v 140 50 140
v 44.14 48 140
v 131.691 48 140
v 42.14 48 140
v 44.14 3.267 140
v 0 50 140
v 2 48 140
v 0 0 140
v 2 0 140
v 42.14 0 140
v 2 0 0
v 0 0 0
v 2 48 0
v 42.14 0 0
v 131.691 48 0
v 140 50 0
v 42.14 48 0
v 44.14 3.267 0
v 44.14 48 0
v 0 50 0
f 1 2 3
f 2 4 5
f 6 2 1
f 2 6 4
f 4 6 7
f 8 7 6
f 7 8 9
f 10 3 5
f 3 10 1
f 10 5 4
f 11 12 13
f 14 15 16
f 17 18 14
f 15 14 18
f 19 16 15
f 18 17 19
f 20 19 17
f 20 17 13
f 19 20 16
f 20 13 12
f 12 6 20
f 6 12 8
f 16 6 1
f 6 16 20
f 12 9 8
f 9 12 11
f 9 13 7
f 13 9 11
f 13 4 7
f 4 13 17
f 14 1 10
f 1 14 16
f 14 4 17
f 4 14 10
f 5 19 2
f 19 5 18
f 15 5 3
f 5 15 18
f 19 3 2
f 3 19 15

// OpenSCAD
walls = 5;
layer_width = 0.4;

thickness = walls * layer_width;
clearance = 0.07;

bed_h = 40;
lamp_d = 140;
rubber_h = 0.7;
clamp_h = 50;

function polar_to_cartesian(length, angle) = [length * cos(angle), length * sin(angle)];

a = lamp_d - bed_h + 2 * thickness + 2 * clearance;
b = clamp_h;
Cangle= atan(a/b);
angle= 180 - Cangle;
shift = polar_to_cartesian(thickness, angle);

Ax = bed_h + thickness + 2 * clearance;
Ay = 0;
Bx = lamp_d;
By = clamp_h;

Ax2 = Ax + shift[0];
Ay2 = Ay + shift[1];
Bx2 = Bx + shift[0];
By2 = By + shift[1];

v = [Bx2 - Ax2, By2 - Ay2];
n = [v[1] * -1, v[0]];
c = -n[0] * Bx2 - n[1] * By2;

x = bed_h + thickness + 2 * clearance + thickness;
y = (-c - n[0] * x) / n[1];

y2 = clamp_h - thickness;
x2 = (-c - n[1] * y2) / n[0];

difference() {
  cube([bed_h + 2 * thickness + 2 * clearance, clamp_h, lamp_d]);
  translate([thickness, -thickness, -1])
    cube([bed_h + thickness + 1, clamp_h, lamp_d + 2]);
}

difference() {
  linear_extrude(lamp_d)
    polygon(points = [
      [bed_h + thickness + 2 * clearance, 0],
      [lamp_d, clamp_h],
      [bed_h + thickness + 2 * clearance, clamp_h],
    ]);
  translate([0, 0, -1])
    linear_extrude(lamp_d + 2)
      polygon(points = [
        [x, y],
        [x2, y2],
        [bed_h + thickness + 2 * clearance + thickness, clamp_h - thickness],
      ]);
}
